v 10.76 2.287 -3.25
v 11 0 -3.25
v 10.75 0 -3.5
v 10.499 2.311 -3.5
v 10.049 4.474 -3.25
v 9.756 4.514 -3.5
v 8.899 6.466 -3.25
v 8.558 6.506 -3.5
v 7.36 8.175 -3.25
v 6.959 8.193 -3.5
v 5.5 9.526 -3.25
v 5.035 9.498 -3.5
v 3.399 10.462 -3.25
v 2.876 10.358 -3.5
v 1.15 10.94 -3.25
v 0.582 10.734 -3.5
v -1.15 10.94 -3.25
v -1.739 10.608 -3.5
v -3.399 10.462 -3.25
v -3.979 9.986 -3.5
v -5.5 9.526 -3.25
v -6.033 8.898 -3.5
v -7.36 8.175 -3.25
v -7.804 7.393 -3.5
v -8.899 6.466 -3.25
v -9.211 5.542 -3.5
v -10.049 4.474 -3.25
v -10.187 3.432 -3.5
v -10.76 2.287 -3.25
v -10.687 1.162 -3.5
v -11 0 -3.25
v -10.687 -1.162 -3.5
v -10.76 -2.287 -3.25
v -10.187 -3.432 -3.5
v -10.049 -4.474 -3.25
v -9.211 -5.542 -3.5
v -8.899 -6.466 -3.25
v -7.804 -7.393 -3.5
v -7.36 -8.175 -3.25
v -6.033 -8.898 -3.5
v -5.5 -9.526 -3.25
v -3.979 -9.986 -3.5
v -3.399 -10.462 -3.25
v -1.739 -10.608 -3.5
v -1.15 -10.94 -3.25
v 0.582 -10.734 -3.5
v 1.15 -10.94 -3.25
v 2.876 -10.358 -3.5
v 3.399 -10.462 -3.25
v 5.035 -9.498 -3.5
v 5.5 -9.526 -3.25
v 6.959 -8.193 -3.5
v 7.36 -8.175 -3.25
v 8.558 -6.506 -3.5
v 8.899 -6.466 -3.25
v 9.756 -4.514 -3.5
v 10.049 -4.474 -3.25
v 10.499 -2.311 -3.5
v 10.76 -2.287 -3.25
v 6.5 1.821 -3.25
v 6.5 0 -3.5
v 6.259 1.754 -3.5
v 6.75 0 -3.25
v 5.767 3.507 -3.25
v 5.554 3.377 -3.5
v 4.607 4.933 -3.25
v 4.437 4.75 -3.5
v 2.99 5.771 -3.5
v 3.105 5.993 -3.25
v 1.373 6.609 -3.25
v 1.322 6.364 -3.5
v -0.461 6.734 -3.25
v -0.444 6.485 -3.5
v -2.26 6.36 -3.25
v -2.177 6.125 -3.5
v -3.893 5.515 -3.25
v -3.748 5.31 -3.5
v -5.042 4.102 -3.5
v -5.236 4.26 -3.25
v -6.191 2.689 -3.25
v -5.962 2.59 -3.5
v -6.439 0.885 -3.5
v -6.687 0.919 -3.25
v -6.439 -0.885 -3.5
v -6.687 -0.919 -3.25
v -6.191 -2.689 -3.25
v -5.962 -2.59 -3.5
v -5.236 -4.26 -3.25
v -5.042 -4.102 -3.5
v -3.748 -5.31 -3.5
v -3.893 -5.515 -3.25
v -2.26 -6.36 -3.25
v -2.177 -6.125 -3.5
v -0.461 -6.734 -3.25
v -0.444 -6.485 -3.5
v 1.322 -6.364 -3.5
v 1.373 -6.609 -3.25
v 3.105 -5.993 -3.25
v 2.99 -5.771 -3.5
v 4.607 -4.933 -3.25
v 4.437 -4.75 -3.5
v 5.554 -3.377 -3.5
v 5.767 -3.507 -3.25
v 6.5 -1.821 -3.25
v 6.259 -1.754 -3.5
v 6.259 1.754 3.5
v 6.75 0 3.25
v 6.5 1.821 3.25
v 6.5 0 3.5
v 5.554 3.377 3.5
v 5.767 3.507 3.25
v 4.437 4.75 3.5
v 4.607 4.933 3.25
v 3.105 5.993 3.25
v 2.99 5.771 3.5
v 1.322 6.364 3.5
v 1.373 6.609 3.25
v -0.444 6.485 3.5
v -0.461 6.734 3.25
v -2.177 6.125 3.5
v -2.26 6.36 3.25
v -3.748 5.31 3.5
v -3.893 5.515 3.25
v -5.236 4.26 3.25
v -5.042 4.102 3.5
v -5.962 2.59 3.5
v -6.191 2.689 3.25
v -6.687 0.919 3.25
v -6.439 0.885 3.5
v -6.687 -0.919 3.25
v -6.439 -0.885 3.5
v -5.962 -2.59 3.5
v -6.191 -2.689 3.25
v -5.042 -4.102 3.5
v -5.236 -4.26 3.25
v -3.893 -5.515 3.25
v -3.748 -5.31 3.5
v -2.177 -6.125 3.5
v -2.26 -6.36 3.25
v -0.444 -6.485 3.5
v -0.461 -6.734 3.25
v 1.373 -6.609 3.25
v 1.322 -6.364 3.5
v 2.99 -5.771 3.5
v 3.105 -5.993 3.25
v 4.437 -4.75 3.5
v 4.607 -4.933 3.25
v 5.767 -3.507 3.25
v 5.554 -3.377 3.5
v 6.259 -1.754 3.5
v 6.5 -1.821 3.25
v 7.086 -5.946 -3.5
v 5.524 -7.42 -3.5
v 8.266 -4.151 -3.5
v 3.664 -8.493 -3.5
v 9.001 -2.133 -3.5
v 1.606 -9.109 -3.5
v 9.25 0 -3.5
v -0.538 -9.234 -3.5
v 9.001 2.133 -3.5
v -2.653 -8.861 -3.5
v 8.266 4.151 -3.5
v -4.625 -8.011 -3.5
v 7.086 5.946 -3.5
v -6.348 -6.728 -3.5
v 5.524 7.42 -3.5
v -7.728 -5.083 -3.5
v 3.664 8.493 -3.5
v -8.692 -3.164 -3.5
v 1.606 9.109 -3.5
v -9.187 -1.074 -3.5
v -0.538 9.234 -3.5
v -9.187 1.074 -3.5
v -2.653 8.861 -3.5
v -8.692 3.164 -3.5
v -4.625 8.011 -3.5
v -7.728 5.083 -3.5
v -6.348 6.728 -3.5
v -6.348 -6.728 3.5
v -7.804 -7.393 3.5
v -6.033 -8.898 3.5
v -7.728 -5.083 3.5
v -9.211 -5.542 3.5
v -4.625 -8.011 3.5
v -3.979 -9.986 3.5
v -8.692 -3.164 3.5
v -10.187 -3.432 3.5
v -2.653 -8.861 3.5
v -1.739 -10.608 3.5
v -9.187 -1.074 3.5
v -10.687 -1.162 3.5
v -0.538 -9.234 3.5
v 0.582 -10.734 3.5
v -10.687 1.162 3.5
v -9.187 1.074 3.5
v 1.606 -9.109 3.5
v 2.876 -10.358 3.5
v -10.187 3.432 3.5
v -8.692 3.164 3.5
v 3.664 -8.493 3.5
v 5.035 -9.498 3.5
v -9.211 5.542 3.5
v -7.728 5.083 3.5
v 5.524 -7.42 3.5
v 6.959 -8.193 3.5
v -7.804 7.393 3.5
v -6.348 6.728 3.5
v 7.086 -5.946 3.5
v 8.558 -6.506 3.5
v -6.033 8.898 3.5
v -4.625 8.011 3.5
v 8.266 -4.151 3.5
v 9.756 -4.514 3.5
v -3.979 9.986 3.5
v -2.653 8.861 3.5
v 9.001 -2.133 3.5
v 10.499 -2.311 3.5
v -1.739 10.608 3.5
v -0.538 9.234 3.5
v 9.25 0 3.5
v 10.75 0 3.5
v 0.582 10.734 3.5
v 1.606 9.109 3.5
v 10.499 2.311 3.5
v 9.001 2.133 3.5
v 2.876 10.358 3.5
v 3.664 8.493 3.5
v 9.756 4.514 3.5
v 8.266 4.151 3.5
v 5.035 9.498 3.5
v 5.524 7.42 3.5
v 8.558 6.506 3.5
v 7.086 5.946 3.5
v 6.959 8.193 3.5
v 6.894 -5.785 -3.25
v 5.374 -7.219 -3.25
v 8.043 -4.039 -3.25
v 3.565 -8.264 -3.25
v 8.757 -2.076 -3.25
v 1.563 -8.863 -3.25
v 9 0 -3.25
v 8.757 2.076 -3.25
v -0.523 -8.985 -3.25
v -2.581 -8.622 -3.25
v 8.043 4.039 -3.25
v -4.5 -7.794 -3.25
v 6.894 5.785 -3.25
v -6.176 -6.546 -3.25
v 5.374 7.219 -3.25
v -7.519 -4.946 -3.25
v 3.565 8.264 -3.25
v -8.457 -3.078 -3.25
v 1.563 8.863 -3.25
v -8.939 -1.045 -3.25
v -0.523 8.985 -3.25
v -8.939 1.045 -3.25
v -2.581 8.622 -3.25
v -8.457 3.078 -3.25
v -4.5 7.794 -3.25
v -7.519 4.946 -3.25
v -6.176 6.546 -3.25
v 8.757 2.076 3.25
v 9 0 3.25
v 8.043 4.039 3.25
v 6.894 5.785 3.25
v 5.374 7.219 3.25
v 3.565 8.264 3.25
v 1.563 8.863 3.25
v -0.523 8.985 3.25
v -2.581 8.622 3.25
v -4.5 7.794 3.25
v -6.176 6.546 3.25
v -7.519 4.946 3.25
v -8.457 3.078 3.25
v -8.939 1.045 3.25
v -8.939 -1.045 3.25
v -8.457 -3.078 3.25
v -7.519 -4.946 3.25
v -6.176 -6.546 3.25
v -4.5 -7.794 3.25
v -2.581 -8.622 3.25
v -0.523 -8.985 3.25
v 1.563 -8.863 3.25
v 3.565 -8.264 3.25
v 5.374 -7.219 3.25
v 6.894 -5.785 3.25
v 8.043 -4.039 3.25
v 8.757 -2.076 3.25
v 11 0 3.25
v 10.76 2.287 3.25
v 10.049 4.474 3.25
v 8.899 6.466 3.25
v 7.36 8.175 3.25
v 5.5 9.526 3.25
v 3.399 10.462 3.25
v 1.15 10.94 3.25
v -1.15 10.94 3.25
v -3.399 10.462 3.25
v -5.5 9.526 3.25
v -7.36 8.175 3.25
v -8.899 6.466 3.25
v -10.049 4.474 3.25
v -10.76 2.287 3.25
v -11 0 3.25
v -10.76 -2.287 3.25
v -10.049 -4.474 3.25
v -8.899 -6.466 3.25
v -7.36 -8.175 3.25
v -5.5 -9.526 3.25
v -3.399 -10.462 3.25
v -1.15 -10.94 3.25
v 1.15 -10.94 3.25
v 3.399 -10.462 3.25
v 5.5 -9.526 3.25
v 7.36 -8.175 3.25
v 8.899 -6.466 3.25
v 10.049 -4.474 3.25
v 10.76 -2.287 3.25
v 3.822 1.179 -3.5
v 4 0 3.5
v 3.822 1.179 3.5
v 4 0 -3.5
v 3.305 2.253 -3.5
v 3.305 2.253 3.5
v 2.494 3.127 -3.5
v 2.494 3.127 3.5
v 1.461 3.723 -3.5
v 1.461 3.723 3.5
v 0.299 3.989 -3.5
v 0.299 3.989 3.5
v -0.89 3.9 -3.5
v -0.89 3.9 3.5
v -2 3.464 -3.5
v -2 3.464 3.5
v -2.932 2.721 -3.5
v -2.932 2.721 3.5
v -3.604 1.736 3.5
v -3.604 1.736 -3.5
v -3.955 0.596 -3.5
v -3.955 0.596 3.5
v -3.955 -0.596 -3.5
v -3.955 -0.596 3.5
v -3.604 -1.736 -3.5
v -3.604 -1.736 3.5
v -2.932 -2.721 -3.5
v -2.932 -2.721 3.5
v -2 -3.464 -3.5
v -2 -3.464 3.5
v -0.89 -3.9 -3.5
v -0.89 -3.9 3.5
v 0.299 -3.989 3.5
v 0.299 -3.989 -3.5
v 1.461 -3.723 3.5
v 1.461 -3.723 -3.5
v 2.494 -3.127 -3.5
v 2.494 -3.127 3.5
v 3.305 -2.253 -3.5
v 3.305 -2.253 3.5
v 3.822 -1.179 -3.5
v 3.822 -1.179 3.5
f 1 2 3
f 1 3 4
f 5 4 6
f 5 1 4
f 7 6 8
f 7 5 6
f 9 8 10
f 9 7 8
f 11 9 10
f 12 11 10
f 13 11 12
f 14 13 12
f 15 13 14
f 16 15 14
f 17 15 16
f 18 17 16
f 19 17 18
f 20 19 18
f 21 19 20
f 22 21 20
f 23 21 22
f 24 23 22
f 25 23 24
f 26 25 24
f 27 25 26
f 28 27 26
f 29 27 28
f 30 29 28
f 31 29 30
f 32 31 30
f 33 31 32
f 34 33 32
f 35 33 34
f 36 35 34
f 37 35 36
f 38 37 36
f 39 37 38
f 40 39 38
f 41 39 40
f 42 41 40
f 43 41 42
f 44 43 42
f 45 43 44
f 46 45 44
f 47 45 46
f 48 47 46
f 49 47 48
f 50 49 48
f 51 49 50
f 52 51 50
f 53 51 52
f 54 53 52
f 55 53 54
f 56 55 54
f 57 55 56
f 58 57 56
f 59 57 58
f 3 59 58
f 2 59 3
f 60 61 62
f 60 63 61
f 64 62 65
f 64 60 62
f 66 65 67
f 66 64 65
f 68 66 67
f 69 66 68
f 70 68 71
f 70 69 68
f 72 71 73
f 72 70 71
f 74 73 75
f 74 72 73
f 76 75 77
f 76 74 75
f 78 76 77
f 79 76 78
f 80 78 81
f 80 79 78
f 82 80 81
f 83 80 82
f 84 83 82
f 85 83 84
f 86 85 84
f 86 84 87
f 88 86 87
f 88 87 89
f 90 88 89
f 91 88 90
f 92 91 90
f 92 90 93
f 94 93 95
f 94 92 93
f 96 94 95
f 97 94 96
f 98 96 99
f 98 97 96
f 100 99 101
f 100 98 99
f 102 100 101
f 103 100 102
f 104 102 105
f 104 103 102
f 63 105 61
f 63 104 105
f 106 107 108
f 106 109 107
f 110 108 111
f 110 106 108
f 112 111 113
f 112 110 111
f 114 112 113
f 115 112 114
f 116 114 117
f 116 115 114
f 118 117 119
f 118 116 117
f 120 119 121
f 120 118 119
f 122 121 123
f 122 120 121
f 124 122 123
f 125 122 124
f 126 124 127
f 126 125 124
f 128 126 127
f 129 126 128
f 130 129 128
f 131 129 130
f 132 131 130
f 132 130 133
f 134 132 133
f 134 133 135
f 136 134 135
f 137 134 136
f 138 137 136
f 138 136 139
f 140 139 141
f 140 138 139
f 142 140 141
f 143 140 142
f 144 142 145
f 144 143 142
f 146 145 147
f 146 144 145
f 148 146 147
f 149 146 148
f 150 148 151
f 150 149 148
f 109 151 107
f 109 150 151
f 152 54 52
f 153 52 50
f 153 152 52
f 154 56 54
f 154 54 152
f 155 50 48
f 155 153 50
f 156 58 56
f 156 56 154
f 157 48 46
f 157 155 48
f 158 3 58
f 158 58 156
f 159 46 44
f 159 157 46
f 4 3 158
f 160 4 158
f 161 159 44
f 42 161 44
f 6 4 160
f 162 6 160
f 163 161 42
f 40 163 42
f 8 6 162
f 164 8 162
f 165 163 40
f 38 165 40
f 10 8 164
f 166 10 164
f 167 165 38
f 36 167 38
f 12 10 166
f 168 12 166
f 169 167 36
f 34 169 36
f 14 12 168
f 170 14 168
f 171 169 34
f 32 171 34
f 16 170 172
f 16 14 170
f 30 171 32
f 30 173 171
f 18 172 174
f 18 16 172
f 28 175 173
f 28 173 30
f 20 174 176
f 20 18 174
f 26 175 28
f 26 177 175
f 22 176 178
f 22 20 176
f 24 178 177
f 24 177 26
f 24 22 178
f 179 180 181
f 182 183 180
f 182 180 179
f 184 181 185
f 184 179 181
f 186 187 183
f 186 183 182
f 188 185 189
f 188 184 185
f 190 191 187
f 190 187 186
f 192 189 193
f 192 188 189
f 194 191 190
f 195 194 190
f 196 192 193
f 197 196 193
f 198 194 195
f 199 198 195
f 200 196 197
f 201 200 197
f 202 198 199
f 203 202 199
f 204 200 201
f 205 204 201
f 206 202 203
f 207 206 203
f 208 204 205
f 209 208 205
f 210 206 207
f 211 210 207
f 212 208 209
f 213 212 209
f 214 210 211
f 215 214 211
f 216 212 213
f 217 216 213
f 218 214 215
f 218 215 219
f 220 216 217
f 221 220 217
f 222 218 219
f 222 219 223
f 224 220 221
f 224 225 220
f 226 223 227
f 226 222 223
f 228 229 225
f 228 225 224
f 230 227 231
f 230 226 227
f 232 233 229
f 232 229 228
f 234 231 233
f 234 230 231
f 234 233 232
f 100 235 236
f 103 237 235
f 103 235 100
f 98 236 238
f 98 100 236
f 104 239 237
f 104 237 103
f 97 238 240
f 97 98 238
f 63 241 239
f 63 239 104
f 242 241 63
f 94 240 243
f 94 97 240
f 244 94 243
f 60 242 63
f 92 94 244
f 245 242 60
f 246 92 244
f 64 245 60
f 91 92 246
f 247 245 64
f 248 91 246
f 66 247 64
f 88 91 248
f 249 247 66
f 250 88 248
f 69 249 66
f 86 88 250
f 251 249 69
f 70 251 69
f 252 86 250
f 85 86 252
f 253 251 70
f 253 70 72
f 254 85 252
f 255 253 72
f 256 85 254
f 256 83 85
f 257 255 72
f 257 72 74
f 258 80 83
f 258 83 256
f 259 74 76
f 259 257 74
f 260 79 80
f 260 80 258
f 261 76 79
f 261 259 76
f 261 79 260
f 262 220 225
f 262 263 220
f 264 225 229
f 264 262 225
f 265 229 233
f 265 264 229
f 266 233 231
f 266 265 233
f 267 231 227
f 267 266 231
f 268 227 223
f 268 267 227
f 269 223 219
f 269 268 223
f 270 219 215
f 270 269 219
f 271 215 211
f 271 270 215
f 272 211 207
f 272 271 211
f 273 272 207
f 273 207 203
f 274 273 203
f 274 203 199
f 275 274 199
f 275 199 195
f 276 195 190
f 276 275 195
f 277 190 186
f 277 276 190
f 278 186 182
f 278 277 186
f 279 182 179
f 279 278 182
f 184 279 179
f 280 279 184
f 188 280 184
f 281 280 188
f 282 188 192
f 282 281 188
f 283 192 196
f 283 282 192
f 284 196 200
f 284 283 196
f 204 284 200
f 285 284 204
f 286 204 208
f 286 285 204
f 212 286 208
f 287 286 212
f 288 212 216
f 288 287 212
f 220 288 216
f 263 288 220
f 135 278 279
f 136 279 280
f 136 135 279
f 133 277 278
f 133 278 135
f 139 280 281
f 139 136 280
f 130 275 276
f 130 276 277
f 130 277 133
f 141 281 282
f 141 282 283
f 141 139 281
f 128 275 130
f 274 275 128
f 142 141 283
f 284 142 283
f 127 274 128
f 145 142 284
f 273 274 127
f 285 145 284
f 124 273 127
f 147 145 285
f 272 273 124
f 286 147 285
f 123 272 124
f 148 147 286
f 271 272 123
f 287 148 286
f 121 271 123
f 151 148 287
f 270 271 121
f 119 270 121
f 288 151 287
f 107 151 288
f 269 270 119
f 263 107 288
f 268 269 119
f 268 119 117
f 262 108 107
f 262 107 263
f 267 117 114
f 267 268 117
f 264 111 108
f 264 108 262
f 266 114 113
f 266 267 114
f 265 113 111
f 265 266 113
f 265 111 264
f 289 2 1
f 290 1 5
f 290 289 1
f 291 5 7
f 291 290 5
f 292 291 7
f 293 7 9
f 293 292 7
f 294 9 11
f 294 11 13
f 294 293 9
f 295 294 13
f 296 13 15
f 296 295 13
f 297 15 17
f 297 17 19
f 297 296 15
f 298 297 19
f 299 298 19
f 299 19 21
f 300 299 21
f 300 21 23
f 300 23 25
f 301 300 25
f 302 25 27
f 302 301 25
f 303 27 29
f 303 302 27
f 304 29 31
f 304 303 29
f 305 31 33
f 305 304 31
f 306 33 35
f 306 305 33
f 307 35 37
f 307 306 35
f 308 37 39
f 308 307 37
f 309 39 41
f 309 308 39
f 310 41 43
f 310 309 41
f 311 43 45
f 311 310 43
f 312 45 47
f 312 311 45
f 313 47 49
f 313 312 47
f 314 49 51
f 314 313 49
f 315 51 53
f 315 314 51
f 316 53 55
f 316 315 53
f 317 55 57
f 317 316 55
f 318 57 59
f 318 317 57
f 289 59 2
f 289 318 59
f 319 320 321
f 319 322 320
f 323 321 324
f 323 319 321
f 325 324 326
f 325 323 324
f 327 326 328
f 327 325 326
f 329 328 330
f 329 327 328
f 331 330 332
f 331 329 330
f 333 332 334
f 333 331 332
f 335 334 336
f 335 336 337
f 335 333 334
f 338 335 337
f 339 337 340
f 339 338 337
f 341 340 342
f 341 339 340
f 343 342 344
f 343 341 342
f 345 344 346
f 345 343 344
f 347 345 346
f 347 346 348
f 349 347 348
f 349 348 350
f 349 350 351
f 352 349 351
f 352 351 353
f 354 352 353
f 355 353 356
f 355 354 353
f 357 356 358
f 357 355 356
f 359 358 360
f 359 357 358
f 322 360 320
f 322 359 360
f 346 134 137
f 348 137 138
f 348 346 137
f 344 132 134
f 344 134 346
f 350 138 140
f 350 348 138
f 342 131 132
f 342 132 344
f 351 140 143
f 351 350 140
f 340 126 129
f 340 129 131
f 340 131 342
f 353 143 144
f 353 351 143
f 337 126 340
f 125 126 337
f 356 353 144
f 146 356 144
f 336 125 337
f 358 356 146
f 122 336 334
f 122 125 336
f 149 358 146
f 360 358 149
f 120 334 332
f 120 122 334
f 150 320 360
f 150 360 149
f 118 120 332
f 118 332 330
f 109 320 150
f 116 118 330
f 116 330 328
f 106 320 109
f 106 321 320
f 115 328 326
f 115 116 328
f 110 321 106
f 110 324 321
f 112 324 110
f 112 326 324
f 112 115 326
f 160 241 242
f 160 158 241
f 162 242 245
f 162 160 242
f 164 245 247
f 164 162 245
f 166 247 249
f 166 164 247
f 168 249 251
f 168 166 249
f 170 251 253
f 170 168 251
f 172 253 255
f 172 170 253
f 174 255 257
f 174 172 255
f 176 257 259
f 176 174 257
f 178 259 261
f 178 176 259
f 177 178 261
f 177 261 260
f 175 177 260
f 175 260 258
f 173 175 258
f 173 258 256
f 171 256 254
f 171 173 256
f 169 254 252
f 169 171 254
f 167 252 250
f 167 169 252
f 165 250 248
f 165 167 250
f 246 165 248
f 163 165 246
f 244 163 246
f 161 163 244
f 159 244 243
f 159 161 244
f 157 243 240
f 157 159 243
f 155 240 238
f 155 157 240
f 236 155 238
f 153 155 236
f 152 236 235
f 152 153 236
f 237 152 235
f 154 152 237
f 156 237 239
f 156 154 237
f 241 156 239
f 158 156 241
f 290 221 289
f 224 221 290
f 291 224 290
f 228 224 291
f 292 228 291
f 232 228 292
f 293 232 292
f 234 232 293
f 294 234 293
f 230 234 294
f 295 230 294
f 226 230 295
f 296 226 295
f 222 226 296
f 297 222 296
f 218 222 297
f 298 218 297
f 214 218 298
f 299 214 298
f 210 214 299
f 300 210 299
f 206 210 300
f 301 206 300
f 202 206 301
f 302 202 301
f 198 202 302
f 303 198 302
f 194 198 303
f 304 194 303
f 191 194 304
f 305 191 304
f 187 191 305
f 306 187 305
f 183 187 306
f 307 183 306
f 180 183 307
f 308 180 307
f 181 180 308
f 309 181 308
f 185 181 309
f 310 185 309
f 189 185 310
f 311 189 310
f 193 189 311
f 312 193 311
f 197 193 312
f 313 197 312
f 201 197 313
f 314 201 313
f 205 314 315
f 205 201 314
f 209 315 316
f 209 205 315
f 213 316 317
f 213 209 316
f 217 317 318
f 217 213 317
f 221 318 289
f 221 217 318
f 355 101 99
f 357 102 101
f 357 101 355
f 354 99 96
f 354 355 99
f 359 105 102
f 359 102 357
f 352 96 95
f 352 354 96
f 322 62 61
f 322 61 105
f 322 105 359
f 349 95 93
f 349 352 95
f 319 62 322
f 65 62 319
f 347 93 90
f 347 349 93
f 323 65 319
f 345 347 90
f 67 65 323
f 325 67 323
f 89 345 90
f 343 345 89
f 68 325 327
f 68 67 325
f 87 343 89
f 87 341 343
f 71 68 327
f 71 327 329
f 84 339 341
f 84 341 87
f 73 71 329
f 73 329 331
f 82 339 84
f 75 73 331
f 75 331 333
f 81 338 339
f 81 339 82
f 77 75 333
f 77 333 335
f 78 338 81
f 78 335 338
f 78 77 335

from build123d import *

# Parameters (mm, degrees)
CHAMFER_SIZE = 0.25


with BuildPart() as part:
    # Sketch001 → Revolution (revolve)
    with BuildSketch(Plane.XZ):
        Polygon((4, -3.5), (6.5, -3.5), (6.75, -3.25), (9, -3.25), (9.25, -3.5), (11, -3.5), (11, 3.5), (9.25, 3.5), (9, 3.25), (6.75, 3.25), (6.5, 3.5), (4, 3.5), align=None)
    revolve(axis=Axis((0, 0, 0), (0, 0, 1)))

    # Chamfer
    chamfer_edges = [part.edges().sort_by_distance(p)[0] for p in [
        (-11, 0, 3.5),
        (-11, 0, -3.5),
    ]]
    chamfer(chamfer_edges, length=CHAMFER_SIZE)


solid = part.part
